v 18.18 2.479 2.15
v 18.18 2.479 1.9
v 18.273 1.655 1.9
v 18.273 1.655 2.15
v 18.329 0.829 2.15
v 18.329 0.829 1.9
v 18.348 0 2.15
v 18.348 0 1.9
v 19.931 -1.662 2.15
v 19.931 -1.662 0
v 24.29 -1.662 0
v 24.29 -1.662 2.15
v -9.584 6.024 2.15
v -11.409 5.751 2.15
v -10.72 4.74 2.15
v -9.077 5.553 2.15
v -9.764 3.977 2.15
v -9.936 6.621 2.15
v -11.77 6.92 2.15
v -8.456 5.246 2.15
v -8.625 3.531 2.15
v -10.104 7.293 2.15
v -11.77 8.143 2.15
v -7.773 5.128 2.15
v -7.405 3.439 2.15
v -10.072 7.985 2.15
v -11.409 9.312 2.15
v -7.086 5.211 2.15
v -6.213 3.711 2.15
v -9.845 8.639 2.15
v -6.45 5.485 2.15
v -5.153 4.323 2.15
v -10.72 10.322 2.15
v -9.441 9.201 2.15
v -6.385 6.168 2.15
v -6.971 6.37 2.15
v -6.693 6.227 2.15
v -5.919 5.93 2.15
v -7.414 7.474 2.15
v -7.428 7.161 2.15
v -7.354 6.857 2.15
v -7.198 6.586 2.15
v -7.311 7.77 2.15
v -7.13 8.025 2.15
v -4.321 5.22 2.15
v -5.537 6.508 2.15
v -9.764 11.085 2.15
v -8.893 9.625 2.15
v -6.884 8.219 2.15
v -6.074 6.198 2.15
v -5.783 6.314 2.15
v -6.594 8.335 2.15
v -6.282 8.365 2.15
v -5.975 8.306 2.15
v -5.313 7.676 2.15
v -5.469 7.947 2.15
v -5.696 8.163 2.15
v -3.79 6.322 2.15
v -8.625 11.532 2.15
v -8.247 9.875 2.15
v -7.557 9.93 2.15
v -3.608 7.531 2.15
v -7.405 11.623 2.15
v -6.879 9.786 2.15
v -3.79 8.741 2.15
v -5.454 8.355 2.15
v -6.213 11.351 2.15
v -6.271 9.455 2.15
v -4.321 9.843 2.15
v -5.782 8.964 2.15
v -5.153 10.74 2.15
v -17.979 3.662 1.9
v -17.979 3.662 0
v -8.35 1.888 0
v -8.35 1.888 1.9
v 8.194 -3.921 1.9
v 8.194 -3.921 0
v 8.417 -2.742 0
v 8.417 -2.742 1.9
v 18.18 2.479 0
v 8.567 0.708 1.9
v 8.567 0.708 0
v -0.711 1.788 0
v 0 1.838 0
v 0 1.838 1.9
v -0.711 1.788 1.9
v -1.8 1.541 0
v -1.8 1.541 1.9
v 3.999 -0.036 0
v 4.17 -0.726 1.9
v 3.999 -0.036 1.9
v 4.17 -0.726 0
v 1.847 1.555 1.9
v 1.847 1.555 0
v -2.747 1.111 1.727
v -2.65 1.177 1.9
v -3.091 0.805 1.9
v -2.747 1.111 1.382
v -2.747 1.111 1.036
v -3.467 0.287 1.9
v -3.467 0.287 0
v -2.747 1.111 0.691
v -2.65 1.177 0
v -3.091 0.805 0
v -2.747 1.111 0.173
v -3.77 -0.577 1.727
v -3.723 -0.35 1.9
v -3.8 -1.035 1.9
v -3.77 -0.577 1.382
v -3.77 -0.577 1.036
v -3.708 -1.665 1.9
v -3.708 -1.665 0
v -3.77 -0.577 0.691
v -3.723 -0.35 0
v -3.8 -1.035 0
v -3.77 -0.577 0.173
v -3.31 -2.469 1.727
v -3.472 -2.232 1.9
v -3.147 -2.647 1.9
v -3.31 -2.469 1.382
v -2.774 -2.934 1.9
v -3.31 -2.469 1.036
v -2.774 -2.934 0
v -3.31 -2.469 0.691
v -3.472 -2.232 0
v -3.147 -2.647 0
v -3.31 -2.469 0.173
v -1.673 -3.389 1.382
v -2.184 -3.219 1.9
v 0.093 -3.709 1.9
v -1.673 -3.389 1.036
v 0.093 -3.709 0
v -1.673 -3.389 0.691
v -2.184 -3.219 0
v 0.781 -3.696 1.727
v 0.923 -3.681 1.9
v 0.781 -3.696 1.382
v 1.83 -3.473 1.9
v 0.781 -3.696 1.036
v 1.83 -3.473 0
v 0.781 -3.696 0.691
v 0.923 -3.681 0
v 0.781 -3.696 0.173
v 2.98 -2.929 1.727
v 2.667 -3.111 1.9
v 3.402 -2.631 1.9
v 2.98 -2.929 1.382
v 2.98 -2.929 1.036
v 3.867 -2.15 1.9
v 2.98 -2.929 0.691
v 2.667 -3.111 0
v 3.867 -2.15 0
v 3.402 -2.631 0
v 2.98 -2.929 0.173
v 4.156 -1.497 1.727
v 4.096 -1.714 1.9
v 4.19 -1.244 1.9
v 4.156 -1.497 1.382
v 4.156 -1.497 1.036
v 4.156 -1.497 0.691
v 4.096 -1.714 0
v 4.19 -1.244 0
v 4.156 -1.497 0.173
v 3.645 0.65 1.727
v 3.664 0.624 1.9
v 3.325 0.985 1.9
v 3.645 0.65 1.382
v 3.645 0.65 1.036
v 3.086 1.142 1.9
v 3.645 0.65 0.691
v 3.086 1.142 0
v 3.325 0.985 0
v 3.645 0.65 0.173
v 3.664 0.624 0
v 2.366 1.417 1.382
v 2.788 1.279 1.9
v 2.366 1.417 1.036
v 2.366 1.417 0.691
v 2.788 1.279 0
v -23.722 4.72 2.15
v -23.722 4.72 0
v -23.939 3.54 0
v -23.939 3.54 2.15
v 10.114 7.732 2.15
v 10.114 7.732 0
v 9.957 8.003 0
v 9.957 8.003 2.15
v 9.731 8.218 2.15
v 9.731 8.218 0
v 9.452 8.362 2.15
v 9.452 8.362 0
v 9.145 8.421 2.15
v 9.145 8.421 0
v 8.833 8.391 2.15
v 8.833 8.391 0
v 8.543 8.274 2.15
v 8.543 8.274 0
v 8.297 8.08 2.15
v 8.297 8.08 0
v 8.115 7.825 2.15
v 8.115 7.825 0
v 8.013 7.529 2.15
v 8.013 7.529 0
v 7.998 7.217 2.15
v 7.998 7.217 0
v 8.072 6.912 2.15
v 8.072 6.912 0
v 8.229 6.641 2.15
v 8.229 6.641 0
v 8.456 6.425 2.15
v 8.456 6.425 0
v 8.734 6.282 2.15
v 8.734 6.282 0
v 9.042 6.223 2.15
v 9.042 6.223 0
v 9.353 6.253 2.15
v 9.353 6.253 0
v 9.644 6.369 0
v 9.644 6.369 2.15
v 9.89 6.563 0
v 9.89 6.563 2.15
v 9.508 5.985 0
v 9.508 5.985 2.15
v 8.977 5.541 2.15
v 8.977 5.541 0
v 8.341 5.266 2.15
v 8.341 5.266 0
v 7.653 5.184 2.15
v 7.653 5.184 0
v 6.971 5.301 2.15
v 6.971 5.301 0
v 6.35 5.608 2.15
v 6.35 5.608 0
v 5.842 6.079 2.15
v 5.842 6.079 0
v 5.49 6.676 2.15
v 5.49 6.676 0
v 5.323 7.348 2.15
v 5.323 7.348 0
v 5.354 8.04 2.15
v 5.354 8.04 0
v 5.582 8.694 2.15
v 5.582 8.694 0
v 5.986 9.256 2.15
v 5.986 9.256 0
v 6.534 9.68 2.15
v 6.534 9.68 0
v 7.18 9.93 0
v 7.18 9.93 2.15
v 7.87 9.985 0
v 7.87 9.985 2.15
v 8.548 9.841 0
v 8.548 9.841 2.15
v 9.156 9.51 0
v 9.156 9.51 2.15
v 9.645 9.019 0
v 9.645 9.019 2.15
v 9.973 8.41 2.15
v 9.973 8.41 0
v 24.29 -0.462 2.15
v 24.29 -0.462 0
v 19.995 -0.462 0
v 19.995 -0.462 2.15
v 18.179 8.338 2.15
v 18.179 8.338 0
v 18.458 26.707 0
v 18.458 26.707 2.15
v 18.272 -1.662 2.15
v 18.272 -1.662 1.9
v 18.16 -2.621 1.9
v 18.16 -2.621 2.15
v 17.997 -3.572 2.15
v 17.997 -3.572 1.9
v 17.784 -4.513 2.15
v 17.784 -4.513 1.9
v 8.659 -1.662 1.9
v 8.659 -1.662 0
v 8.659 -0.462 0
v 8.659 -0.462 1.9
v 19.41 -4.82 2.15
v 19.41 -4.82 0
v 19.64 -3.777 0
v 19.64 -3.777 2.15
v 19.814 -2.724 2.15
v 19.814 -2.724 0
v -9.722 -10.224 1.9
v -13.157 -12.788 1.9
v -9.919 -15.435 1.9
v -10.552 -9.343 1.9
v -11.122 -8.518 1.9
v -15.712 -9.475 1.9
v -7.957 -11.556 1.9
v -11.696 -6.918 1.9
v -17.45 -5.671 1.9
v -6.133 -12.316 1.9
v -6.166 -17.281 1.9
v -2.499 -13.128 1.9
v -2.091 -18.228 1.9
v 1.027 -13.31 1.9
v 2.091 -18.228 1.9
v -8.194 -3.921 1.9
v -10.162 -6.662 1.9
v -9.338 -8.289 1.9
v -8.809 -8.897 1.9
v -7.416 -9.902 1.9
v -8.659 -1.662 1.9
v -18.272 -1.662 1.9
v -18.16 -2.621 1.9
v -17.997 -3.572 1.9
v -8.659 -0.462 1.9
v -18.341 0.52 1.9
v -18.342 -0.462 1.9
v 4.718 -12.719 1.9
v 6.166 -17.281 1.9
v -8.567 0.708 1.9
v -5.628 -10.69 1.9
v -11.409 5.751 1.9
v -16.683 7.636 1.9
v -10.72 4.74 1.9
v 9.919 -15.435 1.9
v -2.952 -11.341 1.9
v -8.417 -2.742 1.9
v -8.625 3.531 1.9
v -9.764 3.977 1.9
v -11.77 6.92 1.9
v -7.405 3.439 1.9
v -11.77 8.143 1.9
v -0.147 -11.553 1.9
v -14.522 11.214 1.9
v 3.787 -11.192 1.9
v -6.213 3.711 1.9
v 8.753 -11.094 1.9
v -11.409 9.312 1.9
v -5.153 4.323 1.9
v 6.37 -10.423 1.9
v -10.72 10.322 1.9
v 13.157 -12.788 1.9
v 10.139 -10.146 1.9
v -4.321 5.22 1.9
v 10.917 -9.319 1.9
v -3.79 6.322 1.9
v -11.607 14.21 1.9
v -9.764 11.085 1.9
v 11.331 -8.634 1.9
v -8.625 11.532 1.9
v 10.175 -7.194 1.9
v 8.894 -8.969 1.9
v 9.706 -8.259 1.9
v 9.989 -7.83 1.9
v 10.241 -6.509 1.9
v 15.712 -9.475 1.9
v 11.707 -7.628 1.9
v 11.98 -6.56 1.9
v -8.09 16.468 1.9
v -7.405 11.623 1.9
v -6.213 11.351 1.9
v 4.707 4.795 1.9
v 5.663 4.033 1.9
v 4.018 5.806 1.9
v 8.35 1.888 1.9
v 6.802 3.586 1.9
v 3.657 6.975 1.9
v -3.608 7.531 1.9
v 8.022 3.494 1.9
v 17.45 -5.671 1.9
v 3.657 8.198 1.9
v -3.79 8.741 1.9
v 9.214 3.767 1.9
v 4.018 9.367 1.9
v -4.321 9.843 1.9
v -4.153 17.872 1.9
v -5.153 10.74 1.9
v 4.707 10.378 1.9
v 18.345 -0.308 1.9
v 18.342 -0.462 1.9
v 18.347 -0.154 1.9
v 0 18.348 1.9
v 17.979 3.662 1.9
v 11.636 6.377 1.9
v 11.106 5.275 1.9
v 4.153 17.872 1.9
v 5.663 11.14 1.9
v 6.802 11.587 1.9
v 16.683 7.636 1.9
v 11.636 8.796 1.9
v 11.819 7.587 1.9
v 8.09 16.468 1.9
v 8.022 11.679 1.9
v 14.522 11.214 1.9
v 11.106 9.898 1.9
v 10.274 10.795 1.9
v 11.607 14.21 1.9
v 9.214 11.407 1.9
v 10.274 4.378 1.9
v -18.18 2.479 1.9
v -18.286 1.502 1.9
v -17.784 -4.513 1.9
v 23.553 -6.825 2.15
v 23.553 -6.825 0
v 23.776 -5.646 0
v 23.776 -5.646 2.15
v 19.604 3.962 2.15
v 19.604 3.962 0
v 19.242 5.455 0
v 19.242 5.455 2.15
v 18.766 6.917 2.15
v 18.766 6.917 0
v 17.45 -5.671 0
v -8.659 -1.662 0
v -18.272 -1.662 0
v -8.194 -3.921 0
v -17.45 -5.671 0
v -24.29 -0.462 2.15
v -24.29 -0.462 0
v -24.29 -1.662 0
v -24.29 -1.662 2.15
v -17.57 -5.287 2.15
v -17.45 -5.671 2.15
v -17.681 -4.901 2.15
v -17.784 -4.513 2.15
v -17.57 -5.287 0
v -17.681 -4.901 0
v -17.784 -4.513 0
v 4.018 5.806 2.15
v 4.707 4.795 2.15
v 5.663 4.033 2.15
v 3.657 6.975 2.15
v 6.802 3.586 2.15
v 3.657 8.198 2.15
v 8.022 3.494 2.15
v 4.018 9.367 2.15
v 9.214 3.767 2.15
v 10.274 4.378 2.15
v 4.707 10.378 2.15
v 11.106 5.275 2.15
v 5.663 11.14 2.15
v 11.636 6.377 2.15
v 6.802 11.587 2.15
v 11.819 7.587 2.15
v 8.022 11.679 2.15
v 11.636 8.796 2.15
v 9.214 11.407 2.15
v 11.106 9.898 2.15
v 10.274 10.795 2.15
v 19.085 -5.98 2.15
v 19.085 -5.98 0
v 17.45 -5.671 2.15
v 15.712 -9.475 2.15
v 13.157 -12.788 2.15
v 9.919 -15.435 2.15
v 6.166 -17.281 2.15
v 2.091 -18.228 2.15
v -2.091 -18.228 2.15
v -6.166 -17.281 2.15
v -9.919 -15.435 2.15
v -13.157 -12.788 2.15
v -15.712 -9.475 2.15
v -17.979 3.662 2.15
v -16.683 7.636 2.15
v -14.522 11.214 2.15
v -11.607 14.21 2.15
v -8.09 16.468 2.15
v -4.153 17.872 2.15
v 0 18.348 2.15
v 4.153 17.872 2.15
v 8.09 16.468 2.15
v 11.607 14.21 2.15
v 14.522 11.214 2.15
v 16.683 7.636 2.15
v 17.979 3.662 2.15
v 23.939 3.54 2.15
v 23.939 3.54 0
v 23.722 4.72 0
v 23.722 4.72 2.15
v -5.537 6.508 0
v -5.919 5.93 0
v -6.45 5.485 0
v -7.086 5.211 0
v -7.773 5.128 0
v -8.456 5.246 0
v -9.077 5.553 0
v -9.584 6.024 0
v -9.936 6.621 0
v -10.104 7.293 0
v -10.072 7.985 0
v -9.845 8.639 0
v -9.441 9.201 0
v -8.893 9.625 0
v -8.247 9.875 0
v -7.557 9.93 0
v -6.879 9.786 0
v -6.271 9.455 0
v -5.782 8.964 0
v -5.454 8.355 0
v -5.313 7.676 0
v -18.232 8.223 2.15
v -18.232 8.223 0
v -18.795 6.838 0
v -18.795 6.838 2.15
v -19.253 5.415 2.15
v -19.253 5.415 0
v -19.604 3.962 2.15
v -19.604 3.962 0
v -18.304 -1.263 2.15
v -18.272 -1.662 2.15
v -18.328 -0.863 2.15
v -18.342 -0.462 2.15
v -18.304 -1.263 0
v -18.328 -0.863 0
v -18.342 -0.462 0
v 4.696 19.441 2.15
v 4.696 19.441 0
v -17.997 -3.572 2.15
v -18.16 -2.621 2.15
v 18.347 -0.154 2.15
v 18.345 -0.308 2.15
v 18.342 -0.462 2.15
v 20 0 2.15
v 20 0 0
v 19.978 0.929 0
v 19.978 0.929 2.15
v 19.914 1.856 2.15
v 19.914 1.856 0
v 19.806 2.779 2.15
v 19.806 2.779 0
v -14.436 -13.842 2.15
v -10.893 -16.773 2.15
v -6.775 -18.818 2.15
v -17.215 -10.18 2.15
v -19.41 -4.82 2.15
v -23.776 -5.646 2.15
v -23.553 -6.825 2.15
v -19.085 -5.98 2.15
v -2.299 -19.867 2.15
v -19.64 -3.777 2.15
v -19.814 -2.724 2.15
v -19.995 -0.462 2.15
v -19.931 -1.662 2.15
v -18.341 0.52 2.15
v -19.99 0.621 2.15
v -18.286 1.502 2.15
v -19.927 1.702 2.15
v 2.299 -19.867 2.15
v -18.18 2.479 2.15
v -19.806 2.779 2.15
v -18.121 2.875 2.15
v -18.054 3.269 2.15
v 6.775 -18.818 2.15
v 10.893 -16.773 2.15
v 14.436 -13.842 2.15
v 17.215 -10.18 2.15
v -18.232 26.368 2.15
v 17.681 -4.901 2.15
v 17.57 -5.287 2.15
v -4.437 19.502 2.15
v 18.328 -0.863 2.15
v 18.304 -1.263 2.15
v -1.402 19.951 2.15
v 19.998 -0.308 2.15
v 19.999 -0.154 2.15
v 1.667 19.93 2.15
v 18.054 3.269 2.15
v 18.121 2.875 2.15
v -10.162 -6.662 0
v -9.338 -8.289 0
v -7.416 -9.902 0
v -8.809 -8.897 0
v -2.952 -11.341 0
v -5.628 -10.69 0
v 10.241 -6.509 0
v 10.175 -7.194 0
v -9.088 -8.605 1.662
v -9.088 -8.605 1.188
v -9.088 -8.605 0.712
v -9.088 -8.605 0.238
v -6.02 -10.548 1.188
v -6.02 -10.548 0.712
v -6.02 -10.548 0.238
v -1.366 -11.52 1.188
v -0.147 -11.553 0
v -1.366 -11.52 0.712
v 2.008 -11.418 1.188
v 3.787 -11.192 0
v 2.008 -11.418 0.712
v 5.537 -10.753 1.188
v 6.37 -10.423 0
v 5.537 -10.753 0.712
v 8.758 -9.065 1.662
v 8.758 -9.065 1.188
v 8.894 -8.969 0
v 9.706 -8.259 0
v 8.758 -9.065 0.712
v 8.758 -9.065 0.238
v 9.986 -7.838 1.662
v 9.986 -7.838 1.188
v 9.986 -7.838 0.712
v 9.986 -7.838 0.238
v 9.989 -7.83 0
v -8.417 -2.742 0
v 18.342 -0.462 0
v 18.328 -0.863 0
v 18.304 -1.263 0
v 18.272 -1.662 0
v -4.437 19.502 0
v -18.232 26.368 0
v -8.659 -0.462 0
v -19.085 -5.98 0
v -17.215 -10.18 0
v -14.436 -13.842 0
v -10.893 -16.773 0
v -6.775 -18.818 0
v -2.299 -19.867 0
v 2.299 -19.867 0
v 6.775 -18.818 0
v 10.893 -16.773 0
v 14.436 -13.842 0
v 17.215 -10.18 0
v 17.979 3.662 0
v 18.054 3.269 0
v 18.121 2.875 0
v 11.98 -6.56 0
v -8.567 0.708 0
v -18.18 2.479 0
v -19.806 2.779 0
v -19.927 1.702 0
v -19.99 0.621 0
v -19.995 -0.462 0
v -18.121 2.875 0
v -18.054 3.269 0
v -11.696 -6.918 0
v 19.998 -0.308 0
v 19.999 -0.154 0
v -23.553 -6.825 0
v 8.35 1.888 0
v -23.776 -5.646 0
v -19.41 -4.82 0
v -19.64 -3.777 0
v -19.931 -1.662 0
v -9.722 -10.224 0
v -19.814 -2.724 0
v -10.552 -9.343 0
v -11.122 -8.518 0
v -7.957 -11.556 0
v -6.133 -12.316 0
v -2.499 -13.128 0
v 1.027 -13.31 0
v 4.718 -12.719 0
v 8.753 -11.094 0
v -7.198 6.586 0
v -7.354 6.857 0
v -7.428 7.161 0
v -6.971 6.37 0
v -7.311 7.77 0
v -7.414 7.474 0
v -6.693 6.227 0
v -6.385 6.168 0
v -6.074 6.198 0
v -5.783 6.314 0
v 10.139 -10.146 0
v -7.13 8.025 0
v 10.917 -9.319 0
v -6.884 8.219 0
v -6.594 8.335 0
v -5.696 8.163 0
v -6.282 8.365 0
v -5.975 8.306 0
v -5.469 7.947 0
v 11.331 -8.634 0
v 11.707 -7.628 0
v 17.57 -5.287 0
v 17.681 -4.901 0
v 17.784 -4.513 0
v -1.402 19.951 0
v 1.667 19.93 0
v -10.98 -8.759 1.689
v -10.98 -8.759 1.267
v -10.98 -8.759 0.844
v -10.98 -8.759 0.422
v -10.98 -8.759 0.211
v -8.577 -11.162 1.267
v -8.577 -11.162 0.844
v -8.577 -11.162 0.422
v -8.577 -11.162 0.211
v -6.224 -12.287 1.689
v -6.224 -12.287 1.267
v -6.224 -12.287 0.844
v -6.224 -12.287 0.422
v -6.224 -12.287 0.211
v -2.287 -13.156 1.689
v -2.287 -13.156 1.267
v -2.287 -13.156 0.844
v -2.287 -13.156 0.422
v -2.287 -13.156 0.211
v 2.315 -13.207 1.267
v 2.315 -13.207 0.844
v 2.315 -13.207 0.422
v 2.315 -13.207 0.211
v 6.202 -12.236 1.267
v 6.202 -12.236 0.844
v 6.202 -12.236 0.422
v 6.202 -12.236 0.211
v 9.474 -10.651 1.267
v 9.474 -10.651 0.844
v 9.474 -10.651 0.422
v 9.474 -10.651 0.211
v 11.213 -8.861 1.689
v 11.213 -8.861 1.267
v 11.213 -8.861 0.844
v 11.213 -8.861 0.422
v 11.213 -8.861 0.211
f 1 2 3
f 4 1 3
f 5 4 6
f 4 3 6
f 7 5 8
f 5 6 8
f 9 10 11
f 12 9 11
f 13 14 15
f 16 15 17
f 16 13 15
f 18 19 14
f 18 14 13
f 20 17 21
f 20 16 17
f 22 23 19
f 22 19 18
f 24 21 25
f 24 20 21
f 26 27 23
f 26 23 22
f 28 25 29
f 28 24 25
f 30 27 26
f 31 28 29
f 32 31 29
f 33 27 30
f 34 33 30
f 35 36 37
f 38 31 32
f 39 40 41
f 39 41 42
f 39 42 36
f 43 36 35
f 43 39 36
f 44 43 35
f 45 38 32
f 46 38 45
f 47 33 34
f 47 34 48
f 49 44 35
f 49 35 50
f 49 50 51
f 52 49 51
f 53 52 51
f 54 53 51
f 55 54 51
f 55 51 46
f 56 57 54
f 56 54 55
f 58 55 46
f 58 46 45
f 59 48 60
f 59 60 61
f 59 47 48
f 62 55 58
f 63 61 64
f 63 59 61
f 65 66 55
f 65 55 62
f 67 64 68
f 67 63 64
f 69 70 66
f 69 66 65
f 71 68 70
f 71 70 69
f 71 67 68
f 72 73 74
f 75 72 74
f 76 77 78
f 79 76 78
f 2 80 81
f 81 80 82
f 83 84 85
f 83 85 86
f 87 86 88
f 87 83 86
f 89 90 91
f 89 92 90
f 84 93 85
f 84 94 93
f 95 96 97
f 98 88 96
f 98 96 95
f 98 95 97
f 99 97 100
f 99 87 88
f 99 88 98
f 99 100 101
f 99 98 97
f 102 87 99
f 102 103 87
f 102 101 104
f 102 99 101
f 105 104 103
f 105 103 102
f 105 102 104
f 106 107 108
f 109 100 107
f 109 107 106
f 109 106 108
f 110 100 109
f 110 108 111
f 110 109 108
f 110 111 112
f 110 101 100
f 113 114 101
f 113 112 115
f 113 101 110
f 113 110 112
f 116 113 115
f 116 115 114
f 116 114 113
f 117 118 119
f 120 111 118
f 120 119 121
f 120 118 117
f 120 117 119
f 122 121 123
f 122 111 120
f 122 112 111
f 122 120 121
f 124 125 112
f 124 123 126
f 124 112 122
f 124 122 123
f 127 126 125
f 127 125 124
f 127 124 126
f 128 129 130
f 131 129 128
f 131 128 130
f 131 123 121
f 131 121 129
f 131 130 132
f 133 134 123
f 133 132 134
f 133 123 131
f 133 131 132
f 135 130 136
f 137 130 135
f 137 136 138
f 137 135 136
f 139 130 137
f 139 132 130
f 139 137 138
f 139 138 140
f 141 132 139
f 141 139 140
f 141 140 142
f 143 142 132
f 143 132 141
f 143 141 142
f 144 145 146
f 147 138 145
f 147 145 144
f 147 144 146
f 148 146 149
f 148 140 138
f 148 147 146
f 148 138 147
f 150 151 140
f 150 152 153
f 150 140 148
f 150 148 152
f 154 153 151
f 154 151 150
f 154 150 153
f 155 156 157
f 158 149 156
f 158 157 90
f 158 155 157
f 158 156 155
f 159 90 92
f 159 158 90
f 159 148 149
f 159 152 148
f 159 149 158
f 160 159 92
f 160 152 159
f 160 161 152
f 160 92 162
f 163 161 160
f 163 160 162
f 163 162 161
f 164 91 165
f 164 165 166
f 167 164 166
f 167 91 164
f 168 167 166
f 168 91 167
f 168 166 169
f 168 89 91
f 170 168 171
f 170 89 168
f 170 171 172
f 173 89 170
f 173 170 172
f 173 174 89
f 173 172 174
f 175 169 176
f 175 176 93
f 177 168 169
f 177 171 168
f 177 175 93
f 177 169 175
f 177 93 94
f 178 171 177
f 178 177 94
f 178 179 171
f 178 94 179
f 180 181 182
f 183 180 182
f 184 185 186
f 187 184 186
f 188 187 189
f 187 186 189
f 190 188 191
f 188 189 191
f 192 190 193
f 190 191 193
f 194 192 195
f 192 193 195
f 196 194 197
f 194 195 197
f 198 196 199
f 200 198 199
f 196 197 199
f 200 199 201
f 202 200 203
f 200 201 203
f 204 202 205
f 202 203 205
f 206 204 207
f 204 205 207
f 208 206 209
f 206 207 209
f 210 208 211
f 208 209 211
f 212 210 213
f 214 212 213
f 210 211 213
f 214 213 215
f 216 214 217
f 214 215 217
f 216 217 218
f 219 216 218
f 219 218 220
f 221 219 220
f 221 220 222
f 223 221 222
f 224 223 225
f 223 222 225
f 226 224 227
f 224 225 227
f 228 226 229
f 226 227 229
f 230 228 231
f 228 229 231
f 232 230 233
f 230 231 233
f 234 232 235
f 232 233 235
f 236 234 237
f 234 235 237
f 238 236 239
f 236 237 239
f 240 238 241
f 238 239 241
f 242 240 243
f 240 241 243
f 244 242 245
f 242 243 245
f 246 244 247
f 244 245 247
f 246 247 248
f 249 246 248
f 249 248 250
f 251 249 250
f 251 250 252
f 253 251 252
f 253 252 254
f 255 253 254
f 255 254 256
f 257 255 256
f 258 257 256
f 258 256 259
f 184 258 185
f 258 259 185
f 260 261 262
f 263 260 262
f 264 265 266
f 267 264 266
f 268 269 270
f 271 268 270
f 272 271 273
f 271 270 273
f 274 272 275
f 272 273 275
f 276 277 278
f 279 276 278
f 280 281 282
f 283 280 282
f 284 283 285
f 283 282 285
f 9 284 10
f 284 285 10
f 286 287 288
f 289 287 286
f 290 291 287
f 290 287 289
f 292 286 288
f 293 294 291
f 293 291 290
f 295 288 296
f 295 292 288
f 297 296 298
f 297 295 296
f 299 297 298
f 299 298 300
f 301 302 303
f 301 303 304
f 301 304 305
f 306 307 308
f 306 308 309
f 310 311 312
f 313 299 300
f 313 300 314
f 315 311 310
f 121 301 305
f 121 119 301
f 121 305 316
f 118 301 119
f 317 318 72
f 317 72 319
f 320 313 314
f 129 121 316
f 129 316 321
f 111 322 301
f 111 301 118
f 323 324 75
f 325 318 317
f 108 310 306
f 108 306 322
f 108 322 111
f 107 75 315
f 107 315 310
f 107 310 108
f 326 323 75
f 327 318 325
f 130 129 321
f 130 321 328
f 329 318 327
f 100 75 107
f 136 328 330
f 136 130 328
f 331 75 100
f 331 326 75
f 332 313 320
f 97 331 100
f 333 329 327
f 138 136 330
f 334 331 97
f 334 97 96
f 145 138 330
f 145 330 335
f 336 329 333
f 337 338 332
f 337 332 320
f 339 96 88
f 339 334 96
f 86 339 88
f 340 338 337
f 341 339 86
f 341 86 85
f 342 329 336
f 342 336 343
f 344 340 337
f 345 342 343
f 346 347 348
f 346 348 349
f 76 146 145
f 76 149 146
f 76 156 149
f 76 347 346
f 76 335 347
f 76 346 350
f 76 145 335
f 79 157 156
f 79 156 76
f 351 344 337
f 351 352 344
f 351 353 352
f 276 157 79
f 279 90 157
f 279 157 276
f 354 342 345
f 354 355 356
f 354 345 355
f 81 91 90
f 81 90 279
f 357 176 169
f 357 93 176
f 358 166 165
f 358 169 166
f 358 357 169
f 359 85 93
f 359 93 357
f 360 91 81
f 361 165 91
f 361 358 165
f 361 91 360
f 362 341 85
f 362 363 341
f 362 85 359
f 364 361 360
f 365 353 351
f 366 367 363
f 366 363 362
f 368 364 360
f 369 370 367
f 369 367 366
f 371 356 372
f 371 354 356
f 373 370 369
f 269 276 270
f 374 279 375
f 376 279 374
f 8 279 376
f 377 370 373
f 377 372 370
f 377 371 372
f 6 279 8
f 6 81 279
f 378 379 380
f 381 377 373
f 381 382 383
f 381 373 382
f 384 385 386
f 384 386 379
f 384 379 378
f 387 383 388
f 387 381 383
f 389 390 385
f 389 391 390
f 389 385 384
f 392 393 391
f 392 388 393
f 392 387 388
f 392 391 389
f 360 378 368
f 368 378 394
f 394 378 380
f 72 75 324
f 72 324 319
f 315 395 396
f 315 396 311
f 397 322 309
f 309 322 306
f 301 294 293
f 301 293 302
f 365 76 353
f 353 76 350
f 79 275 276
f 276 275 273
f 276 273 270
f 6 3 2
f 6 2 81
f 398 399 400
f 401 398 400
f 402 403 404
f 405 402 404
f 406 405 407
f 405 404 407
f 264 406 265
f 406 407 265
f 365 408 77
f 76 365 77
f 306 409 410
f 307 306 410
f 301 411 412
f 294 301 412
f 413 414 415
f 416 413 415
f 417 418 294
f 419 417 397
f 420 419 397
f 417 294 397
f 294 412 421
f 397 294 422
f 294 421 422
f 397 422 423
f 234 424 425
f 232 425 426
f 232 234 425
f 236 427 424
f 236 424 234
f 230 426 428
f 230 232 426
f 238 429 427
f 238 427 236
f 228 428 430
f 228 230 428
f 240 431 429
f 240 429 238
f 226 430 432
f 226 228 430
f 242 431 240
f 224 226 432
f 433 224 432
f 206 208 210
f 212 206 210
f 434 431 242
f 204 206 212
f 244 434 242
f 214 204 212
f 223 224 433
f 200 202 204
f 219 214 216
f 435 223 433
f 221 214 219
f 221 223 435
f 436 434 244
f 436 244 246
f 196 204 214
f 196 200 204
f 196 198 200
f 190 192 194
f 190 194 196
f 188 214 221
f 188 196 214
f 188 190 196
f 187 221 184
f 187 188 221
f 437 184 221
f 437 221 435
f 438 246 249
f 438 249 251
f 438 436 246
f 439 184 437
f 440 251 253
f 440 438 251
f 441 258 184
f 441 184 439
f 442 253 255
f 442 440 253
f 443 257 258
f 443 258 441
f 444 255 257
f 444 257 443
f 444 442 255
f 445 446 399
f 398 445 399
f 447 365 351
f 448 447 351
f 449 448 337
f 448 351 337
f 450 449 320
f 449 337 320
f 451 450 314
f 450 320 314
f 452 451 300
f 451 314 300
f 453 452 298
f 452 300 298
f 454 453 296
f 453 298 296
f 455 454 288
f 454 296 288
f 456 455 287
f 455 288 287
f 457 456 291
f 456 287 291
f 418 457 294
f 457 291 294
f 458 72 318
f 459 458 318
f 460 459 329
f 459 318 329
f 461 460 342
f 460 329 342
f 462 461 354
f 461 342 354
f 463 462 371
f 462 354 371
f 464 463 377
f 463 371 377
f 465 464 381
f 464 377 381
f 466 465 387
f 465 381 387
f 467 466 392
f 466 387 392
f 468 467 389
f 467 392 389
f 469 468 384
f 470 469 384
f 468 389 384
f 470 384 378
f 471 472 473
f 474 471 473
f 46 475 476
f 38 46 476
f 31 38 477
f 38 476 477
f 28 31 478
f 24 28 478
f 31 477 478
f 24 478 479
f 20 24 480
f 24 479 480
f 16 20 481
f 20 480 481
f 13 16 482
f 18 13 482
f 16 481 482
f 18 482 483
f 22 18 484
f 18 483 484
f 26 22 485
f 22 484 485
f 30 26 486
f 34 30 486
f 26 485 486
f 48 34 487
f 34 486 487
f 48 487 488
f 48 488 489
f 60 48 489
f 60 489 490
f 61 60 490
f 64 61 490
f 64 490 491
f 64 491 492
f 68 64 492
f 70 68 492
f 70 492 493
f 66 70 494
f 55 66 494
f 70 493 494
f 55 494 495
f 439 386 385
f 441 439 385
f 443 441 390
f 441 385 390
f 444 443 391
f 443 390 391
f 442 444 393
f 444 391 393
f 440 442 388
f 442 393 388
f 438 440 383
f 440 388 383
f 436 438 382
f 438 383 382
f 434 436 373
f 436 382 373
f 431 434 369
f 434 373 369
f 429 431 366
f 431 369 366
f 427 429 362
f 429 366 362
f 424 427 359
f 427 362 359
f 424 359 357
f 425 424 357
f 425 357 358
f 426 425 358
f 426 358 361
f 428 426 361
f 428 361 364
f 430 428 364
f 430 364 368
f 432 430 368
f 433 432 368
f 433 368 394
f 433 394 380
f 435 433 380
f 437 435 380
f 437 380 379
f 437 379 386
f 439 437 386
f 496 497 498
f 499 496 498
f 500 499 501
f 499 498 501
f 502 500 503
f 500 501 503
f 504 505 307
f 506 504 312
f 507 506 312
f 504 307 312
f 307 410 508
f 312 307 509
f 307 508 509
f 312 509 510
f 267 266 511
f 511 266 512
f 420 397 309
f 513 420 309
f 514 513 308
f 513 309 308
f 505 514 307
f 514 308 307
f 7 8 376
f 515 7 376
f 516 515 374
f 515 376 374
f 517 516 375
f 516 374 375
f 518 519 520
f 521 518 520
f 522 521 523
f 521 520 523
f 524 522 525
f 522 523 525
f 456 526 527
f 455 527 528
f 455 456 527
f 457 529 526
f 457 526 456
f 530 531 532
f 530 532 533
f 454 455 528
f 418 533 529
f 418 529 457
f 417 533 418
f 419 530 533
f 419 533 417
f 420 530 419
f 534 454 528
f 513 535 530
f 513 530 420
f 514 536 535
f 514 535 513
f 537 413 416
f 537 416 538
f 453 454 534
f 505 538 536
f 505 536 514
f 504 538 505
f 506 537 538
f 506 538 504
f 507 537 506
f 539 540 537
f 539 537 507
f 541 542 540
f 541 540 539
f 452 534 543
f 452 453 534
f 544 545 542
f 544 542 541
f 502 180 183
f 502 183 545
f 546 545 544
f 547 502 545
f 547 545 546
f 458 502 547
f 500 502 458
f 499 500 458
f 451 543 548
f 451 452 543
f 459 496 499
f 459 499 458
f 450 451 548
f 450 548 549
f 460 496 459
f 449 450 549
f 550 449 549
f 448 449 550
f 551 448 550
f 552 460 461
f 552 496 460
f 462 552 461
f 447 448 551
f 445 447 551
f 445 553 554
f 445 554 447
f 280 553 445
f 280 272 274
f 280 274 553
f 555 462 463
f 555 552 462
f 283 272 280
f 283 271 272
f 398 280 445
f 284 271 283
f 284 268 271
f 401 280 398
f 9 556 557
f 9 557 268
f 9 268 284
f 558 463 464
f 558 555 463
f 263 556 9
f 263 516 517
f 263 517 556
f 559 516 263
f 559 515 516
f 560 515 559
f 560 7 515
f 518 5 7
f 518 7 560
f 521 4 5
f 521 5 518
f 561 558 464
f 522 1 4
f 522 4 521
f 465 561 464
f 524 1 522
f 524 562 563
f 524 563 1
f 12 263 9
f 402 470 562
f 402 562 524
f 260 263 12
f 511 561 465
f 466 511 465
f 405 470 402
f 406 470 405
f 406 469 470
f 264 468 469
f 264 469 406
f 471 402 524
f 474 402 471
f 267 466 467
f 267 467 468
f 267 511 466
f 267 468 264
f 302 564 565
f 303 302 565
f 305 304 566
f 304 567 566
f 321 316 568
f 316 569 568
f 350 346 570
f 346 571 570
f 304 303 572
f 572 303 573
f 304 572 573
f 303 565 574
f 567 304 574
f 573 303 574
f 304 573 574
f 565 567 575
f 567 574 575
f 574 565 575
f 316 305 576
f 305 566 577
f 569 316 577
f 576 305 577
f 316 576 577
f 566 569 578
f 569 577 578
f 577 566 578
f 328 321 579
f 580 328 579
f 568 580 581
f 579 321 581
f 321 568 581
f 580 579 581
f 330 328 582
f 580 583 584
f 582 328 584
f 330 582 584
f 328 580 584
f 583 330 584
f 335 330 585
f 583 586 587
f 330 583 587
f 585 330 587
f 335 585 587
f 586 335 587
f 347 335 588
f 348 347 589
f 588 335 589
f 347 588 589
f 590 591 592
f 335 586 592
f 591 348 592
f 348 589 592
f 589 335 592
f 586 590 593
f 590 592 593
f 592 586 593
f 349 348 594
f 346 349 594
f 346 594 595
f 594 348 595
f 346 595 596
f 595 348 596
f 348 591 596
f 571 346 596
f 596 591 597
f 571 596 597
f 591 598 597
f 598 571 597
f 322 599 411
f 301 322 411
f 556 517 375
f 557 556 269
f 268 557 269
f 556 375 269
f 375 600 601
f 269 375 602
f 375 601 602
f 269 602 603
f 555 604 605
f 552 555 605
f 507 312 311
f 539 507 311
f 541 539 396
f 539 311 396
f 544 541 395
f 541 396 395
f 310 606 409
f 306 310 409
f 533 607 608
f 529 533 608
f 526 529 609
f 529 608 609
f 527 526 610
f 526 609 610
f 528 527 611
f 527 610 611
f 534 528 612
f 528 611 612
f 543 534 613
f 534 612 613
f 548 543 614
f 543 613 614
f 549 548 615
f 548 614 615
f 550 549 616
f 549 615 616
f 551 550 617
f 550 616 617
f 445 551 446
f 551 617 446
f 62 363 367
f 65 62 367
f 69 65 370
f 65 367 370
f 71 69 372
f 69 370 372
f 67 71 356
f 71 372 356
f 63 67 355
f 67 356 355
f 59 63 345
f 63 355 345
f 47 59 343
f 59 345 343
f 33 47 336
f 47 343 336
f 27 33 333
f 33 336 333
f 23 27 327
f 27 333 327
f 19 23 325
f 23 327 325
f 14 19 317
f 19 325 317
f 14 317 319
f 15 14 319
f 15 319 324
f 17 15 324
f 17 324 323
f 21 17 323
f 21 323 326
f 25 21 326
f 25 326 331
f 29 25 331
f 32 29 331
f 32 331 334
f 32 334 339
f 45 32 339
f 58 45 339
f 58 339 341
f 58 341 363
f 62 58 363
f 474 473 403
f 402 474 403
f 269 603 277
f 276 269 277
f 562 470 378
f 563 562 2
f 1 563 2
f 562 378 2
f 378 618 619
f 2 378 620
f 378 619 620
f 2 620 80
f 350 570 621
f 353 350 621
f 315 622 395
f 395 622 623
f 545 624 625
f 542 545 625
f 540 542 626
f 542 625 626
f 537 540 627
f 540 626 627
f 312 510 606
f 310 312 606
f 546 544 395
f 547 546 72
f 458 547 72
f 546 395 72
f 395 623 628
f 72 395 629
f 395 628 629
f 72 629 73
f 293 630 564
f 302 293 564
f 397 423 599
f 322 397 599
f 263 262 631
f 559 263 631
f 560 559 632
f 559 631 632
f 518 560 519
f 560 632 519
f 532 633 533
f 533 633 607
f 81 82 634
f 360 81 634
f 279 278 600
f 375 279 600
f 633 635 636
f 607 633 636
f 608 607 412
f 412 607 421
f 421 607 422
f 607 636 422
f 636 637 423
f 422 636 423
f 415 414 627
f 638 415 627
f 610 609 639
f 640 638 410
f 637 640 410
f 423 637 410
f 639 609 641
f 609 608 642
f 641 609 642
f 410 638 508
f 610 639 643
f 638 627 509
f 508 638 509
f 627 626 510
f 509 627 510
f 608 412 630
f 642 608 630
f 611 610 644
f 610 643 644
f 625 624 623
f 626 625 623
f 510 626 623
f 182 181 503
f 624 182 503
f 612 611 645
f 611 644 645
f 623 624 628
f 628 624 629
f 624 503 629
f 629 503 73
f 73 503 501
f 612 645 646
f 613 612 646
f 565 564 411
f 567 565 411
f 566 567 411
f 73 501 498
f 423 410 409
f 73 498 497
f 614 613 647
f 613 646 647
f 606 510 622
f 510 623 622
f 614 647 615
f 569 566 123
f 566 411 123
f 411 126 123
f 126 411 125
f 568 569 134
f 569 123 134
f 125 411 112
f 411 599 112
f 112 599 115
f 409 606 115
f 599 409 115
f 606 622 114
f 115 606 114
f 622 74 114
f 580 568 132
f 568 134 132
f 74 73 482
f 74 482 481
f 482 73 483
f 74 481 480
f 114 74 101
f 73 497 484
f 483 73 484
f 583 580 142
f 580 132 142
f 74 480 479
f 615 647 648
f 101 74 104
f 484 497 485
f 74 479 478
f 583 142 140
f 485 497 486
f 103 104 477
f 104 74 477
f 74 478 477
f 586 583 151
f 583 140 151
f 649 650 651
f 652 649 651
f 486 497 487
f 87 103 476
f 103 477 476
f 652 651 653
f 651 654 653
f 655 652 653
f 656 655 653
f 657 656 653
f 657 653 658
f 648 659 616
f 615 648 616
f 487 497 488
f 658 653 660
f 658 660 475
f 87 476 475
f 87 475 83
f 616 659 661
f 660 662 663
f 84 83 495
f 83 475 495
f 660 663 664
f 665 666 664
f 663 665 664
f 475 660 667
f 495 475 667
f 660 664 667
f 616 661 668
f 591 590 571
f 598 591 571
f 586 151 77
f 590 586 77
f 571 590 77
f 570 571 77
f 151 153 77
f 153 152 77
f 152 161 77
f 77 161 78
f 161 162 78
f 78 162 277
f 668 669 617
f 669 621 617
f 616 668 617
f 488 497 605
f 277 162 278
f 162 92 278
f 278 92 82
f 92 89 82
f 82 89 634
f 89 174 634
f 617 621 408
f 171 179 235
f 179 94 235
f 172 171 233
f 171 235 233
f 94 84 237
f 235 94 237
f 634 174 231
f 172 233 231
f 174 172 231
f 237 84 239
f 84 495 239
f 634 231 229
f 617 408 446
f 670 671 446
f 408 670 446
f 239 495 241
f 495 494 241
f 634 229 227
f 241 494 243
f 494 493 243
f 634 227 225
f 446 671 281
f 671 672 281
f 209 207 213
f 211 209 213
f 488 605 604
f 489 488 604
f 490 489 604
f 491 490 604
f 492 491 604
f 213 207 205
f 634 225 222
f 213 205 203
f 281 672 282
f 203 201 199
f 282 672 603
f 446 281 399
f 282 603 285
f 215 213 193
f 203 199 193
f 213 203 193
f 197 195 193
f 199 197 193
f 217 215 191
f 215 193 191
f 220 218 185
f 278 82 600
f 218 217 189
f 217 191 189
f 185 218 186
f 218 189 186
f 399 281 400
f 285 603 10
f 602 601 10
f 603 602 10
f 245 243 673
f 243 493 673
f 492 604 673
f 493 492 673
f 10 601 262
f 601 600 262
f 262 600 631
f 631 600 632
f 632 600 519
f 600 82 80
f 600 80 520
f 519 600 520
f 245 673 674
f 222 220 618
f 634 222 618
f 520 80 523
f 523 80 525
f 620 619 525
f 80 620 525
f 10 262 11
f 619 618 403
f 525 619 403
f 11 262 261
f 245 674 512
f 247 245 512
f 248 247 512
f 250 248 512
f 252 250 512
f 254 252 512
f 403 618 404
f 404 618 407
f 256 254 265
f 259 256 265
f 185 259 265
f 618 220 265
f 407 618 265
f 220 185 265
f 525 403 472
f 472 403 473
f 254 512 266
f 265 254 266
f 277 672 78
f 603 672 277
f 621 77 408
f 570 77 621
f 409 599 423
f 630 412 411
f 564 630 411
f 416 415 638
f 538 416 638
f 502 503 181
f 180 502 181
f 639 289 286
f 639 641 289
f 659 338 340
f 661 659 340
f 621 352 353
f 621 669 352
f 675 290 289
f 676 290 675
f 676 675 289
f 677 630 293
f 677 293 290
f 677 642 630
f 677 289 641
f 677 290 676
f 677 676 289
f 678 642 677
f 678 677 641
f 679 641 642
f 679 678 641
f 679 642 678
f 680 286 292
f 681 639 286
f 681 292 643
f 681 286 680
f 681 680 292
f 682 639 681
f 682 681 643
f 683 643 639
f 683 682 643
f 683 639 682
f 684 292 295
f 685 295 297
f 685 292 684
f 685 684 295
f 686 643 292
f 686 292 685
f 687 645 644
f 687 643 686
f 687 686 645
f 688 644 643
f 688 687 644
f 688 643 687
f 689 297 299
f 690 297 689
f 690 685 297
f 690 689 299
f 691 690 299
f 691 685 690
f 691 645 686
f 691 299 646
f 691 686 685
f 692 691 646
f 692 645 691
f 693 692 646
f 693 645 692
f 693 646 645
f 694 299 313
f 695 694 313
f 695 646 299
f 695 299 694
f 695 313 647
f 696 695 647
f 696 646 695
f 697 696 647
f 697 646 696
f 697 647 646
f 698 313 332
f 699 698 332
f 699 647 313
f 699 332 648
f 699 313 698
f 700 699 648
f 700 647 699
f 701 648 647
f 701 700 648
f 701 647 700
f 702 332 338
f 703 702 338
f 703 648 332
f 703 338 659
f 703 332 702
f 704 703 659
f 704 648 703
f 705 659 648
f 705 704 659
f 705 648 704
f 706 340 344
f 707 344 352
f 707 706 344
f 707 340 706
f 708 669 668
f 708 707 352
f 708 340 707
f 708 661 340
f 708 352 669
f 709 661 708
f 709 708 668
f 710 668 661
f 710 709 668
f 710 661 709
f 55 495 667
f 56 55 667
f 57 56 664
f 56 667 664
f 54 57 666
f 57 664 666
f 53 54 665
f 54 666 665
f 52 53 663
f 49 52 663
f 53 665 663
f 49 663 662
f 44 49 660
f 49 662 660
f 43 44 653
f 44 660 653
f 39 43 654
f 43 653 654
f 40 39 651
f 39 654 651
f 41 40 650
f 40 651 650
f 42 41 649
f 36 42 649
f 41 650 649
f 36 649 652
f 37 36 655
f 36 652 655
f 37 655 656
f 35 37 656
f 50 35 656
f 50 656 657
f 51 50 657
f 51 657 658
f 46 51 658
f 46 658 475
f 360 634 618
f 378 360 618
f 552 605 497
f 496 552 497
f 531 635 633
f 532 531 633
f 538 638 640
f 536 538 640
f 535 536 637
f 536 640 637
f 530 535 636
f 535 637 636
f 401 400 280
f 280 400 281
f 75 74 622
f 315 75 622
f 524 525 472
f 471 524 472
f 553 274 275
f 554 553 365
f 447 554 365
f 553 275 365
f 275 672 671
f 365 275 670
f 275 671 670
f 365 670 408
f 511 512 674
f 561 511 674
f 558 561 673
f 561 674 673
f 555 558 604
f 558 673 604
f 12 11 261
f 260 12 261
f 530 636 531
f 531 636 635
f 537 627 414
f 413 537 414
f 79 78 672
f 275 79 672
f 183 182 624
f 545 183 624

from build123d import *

# Parameters (mm, degrees)
F1_DEPTH = 2.15
F0_R     = 4.1036540216
F2_DEPTH = 1.9


with BuildPart() as f1:
    # F0 (on Top) → F1 (new body)
    with BuildSketch(Plane.XY):
        with BuildLine():
            ThreePointArc((-18.2315145686, 8.2226441328), (-12.65969487, 15.4832853684), (-4.4368690482, 19.5016459062))
            Line((-4.4368690482, 19.5016459062), (-18.2315145686, 26.3684952472))
            Line((-18.2315145686, 26.3684952472), (-18.2315145686, 8.2226441328))
        make_face()
        with BuildLine():
            ThreePointArc((19.6037292835, 3.9615398747), (19.0177158249, 6.1908387802), (18.179090742, 8.3379050004))
            ThreePointArc((18.179090742, 8.3379050004), (12.7135725246, 15.439076192), (4.6958516098, 19.4409098979))
            ThreePointArc((4.6958516098, 19.4409098979), (0.1330045393, 19.9995577399), (-4.4368690482, 19.5016459062))
            ThreePointArc((-4.4368690482, 19.5016459062), (-12.65969487, 15.4832853684), (-18.2315145686, 8.2226441328))
            ThreePointArc((-18.2315145686, 8.2226441328), (-19.0372180665, 6.1306058663), (-19.6037292835, 3.9615398747))
            Line((-19.6037292835, 3.9615398747), (-17.978764876, 3.6621177333))
            ThreePointArc((-17.978764876, 3.6621177333), (0, 18.3479451917), (17.978764876, 3.6621177333))
            Line((17.978764876, 3.6621177333), (19.6037292835, 3.9615398747))
        make_face()
        with BuildLine():
            ThreePointArc((4.6958516098, 19.4409098979), (12.7135725246, 15.439076192), (18.179090742, 8.3379050004))
            Line((18.179090742, 8.3379050004), (18.4577219188, 26.7067048699))
            Line((18.4577219188, 26.7067048699), (4.6958516098, 19.4409098979))
        make_face()
        with BuildLine():
            ThreePointArc((-18.3421170895, -0.4624212731), (-18.3200411776, 1.0115255856), (-18.1797121369, 2.4789431978))
            Line((-18.1797121369, 2.4789431978), (-19.8060417091, 2.7786168896))
            ThreePointArc((-19.8060417091, 2.7786168896), (-19.9662193685, 1.1619312074), (-19.9946534495, -0.4624212731))
            Line((-19.9946534495, -0.4624212731), (-18.3421170895, -0.4624212731))
        make_face()
        with BuildLine():
            ThreePointArc((-19.8060417091, 2.7786168896), (-19.7137601466, 3.3715961919), (-19.6037292835, 3.9615398747))
            Line((-19.6037292835, 3.9615398747), (-23.7219620696, 4.72038116))
            Line((-23.7219620696, 4.72038116), (-23.9394178087, 3.5402485397))
            Line((-23.9394178087, 3.5402485397), (-19.8060417091, 2.7786168896))
        make_face()
        with BuildLine():
            ThreePointArc((-18.1797121369, 2.4789431978), (-18.0889148505, 3.0721738704), (-17.978764876, 3.6621177333))
            Line((-17.978764876, 3.6621177333), (-19.6037292835, 3.9615398747))
            ThreePointArc((-19.6037292835, 3.9615398747), (-19.7137601466, 3.3715961919), (-19.8060417091, 2.7786168896))
            Line((-19.8060417091, 2.7786168896), (-18.1797121369, 2.4789431978))
        make_face()
        with BuildLine():
            ThreePointArc((-18.2724778908, -1.6624212731), (-18.3171269962, -1.0629917055), (-18.3421170895, -0.4624212731))
            Line((-18.3421170895, -0.4624212731), (-19.9946534495, -0.4624212731))
            ThreePointArc((-19.9946534495, -0.4624212731), (-19.9717360631, -1.0629010416), (-19.9307891342, -1.6624212731))
            Line((-19.9307891342, -1.6624212731), (-18.2724778908, -1.6624212731))
        make_face()
        with BuildLine():
            ThreePointArc((-19.9307891342, -1.6624212731), (-19.9717360631, -1.0629010416), (-19.9946534495, -0.4624212731))
            Line((-19.9946534495, -0.4624212731), (-24.2901714519, -0.4624212731))
            Line((-24.2901714519, -0.4624212731), (-24.2901714519, -1.6624212731))
            Line((-24.2901714519, -1.6624212731), (-19.9307891342, -1.6624212731))
        make_face()
        with BuildLine():
            ThreePointArc((-19.0850973204, -5.9798879815), (-19.2565147907, -5.4024659293), (-19.4104665936, -4.8201438381))
            Line((-19.4104665936, -4.8201438381), (-23.7761723296, -5.645501185))
            Line((-23.7761723296, -5.645501185), (-23.5532553866, -6.8246144266))
            Line((-23.5532553866, -6.8246144266), (-19.0850973204, -5.9798879815))
        make_face()
        with BuildLine():
            ThreePointArc((-17.4496494979, -5.6706988246), (-17.6265029869, -5.0944563215), (-17.7843327477, -4.5127155326))
            Line((-17.7843327477, -4.5127155326), (-19.4104665936, -4.8201438381))
            ThreePointArc((-19.4104665936, -4.8201438381), (-19.2565147907, -5.4024659293), (-19.0850973204, -5.9798879815))
            Line((-19.0850973204, -5.9798879815), (-17.4496494979, -5.6706988246))
        make_face()
        with BuildLine():
            ThreePointArc((-17.7843327477, -4.5127155326), (-18.0846466014, -3.0972003588), (-18.2724778908, -1.6624212731))
            Line((-18.2724778908, -1.6624212731), (-19.9307891342, -1.6624212731))
            ThreePointArc((-19.9307891342, -1.6624212731), (-19.7338897207, -3.2517067044), (-19.4104665936, -4.8201438381))
            Line((-19.4104665936, -4.8201438381), (-17.7843327477, -4.5127155326))
        make_face()
        with BuildLine():
            ThreePointArc((-19.0850973204, -5.9798879815), (0, -20), (19.0850973204, -5.9798879815))
            Line((19.0850973204, -5.9798879815), (17.4496494979, -5.6706988246))
            ThreePointArc((17.4496494979, -5.6706988246), (0, -18.3479451917), (-17.4496494979, -5.6706988246))
            Line((-17.4496494979, -5.6706988246), (-19.0850973204, -5.9798879815))
        make_face()
        with BuildLine():
            ThreePointArc((19.4104665936, -4.8201438381), (19.7338897207, -3.2517067044), (19.9307891342, -1.6624212731))
            Line((19.9307891342, -1.6624212731), (18.2724778908, -1.6624212731))
            ThreePointArc((18.2724778908, -1.6624212731), (18.0846466014, -3.0972003588), (17.7843327477, -4.5127155326))
            Line((17.7843327477, -4.5127155326), (19.4104665936, -4.8201438381))
        make_face()
        with BuildLine():
            ThreePointArc((19.0850973204, -5.9798879815), (19.2565147907, -5.4024659293), (19.4104665936, -4.8201438381))
            Line((19.4104665936, -4.8201438381), (17.7843327477, -4.5127155326))
            ThreePointArc((17.7843327477, -4.5127155326), (17.6265029869, -5.0944563215), (17.4496494979, -5.6706988246))
            Line((17.4496494979, -5.6706988246), (19.0850973204, -5.9798879815))
        make_face()
        with BuildLine():
            Line((23.7761723296, -5.645501185), (19.4104665936, -4.8201438381))
            ThreePointArc((19.4104665936, -4.8201438381), (19.2565147907, -5.4024659293), (19.0850973204, -5.9798879815))
            Line((19.0850973204, -5.9798879815), (23.5532553866, -6.8246144266))
            Line((23.5532553866, -6.8246144266), (23.7761723296, -5.645501185))
        make_face()
        with BuildLine():
            Line((24.2901714519, -0.4624212731), (19.9946534495, -0.4624212731))
            ThreePointArc((19.9946534495, -0.4624212731), (19.9717360631, -1.0629010416), (19.9307891342, -1.6624212731))
            Line((19.9307891342, -1.6624212731), (24.2901714519, -1.6624212731))
            Line((24.2901714519, -1.6624212731), (24.2901714519, -0.4624212731))
        make_face()
        with BuildLine():
            ThreePointArc((19.9307891342, -1.6624212731), (19.9717360631, -1.0629010416), (19.9946534495, -0.4624212731))
            Line((19.9946534495, -0.4624212731), (18.3421170895, -0.4624212731))
            ThreePointArc((18.3421170895, -0.4624212731), (18.3171269962, -1.0629917055), (18.2724778908, -1.6624212731))
            Line((18.2724778908, -1.6624212731), (19.9307891342, -1.6624212731))
        make_face()
        with BuildLine():
            ThreePointArc((20, 0), (19.9514515033, 1.3926890929), (19.8060417091, 2.7786168896))
            Line((19.8060417091, 2.7786168896), (18.1797121369, 2.4789431978))
            ThreePointArc((18.1797121369, 2.4789431978), (18.305838613, 1.2423225969), (18.3479451917, 0))
            ThreePointArc((18.3479451917, 0), (18.3464881083, -0.2312289993), (18.3421170895, -0.4624212731))
            Line((18.3421170895, -0.4624212731), (19.9946534495, -0.4624212731))
            ThreePointArc((19.9946534495, -0.4624212731), (19.9986633177, -0.2312260903), (20, 0))
        make_face()
        with BuildLine():
            Line((23.7219620696, 4.72038116), (19.6037292835, 3.9615398747))
            ThreePointArc((19.6037292835, 3.9615398747), (19.7137601466, 3.3715961919), (19.8060417091, 2.7786168896))
            Line((19.8060417091, 2.7786168896), (23.9394178087, 3.5402485397))
            Line((23.9394178087, 3.5402485397), (23.7219620696, 4.72038116))
        make_face()
        with BuildLine():
            ThreePointArc((19.8060417091, 2.7786168896), (19.7137601466, 3.3715961919), (19.6037292835, 3.9615398747))
            Line((19.6037292835, 3.9615398747), (17.978764876, 3.6621177333))
            ThreePointArc((17.978764876, 3.6621177333), (18.0889148505, 3.0721738704), (18.1797121369, 2.4789431978))
            Line((18.1797121369, 2.4789431978), (19.8060417091, 2.7786168896))
        make_face()
    extrude(amount=F1_DEPTH)


with BuildPart() as f1b:
    # F0 (on Top) → F1, piece 2 (new body)
    with BuildSketch(Plane.XY):
        with Locations((-7.7118381825, 7.5312841645)):
            Circle(F0_R)
        with BuildLine():
            ThreePointArc((-5.5369759371, 6.5077966729), (-10.0723658161, 7.9845630229), (-5.3125703898, 7.6764271657))
            ThreePointArc((-5.3125703898, 7.6764271657), (-5.253350505, 7.4752971286), (-5.2333685565, 7.2665843875))
            ThreePointArc((-5.2333685565, 7.2665843875), (-5.3120870377, 6.8579475569), (-5.5369759371, 6.5077966729))
        make_face(mode=Mode.SUBTRACT)
        with BuildLine():
            ThreePointArc((-5.5369759371, 6.5077966729), (-5.3660793806, 7.0069101804), (-5.3081842074, 7.5312841645))
            ThreePointArc((-5.3081842074, 7.5312841645), (-5.3092810033, 7.6038887948), (-5.3125703898, 7.6764271657))
            ThreePointArc((-5.3125703898, 7.6764271657), (-7.4136323648, 7.4740213769), (-5.5369759371, 6.5077966729))
        make_face()
        with BuildLine():
            ThreePointArc((-5.3125703898, 7.6764271657), (-5.3092810033, 7.6038887948), (-5.3081842074, 7.5312841645))
            ThreePointArc((-5.3081842074, 7.5312841645), (-5.3660793806, 7.0069101804), (-5.5369759371, 6.5077966729))
            ThreePointArc((-5.5369759371, 6.5077966729), (-5.3120870377, 6.8579475569), (-5.2333685565, 7.2665843875))
            ThreePointArc((-5.2333685565, 7.2665843875), (-5.253350505, 7.4752971286), (-5.3125703898, 7.6764271657))
        make_face()
    extrude(amount=F1_DEPTH)


with BuildPart() as f1c:
    # F0 (on Top) → F1, piece 3 (new body)
    with BuildSketch(Plane.XY):
        with Locations((7.7149522848, 7.5865211994)):
            Circle(F0_R)
        with BuildLine():
            ThreePointArc((9.8898145302, 6.5630337078), (5.3544246513, 8.0398000578), (10.1142200775, 7.7316642005))
            ThreePointArc((10.1142200775, 7.7316642005), (10.1734399624, 7.5305341635), (10.1934219108, 7.3218214224))
            ThreePointArc((10.1934219108, 7.3218214224), (10.1147034296, 6.9131845918), (9.8898145302, 6.5630337078))
        make_face(mode=Mode.SUBTRACT)
        with BuildLine():
            ThreePointArc((9.8898145302, 6.5630337078), (10.0607110867, 7.0621472153), (10.1186062599, 7.5865211994))
            ThreePointArc((10.1186062599, 7.5865211994), (10.1175094641, 7.6591258297), (10.1142200775, 7.7316642005))
            ThreePointArc((10.1142200775, 7.7316642005), (8.0131581026, 7.5292584118), (9.8898145302, 6.5630337078))
        make_face()
        with BuildLine():
            ThreePointArc((10.1142200775, 7.7316642005), (10.1175094641, 7.6591258297), (10.1186062599, 7.5865211994))
            ThreePointArc((10.1186062599, 7.5865211994), (10.0607110867, 7.0621472153), (9.8898145302, 6.5630337078))
            ThreePointArc((9.8898145302, 6.5630337078), (10.1147034296, 6.9131845918), (10.1934219108, 7.3218214224))
            ThreePointArc((10.1934219108, 7.3218214224), (10.1734399624, 7.5305341635), (10.1142200775, 7.7316642005))
        make_face()
    extrude(amount=F1_DEPTH)


with BuildPart() as f2:
    # F0 (on Top) → F2 (new body)
    with BuildSketch(Plane.XY):
        with BuildLine():
            Line((8.3496756393, 1.887825013), (17.978764876, 3.6621177333))
            ThreePointArc((17.978764876, 3.6621177333), (0, 18.3479451917), (-17.978764876, 3.6621177333))
            Line((-17.978764876, 3.6621177333), (-8.3496756393, 1.887825013))
            Line((-8.3496756393, 1.887825013), (-8.5671313784, 0.7076923927))
            Line((-8.5671313784, 0.7076923927), (-18.1797121369, 2.4789431978))
            ThreePointArc((-18.1797121369, 2.4789431978), (-18.3200411776, 1.0115255856), (-18.3421170895, -0.4624212731))
            Line((-18.3421170895, -0.4624212731), (-8.6590945721, -0.4624212731))
            Line((-8.6590945721, -0.4624212731), (-8.6590945721, -1.6624212731))
            Line((-8.6590945721, -1.6624212731), (-18.2724778908, -1.6624212731))
            ThreePointArc((-18.2724778908, -1.6624212731), (-18.0846466014, -3.0972003588), (-17.7843327477, -4.5127155326))
            Line((-17.7843327477, -4.5127155326), (-8.4171642217, -2.7418079567))
            Line((-8.4171642217, -2.7418079567), (-8.1942472787, -3.9209211983))
            Line((-8.1942472787, -3.9209211983), (-17.4496494979, -5.6706988246))
            ThreePointArc((-17.4496494979, -5.6706988246), (0, -18.3479451917), (17.4496494979, -5.6706988246))
            Line((17.4496494979, -5.6706988246), (8.1942472787, -3.9209211983))
            Line((8.1942472787, -3.9209211983), (8.4171642217, -2.7418079567))
            Line((8.4171642217, -2.7418079567), (17.7843327477, -4.5127155326))
            ThreePointArc((17.7843327477, -4.5127155326), (18.0846466014, -3.0972003588), (18.2724778908, -1.6624212731))
            Line((18.2724778908, -1.6624212731), (8.6590945721, -1.6624212731))
            Line((8.6590945721, -1.6624212731), (8.6590945721, -0.4624212731))
            Line((8.6590945721, -0.4624212731), (18.3421170895, -0.4624212731))
            ThreePointArc((18.3421170895, -0.4624212731), (18.3464881083, -0.2312289993), (18.3479451917, 0))
            ThreePointArc((18.3479451917, 0), (18.305838613, 1.2423225969), (18.1797121369, 2.4789431978))
            Line((18.1797121369, 2.4789431978), (8.5671313784, 0.7076923927))
            Line((8.5671313784, 0.7076923927), (8.3496756393, 1.887825013))
        make_face()
        with BuildLine():
            Line((-11.6958739236, -6.9176834077), (-10.1618021727, -6.6620046273))
            add(Edge.make_bspline(
                [(-10.1618021727, -6.6620046273), (-9.8900116773, -7.3300264218), (-9.2706047281, -8.8524392682), (-6.0490483327, -10.8328828476), (-1.3745638516, -11.690245176), (1.9800848773, -11.4468079335), (5.5595215389, -11.0179939412), (8.7279029447, -9.1864827043), (10.1426697727, -7.9661276659), (10.2098408587, -6.9739310726), (10.2413436398, -6.5085976385)],
                knots=[0, 0, 0, 0, 0.1087885677, 0.2479277089, 0.4071152467, 0.5412765042, 0.6796227072, 0.8188582734, 0.9150457659, 1, 1, 1, 1], degree=3))
            Line((10.2413436398, -6.5085976385), (11.9799589738, -6.5597333014))
            add(Edge.make_bspline(
                [(-11.6958739236, -6.9176834077), (-11.5432726645, -7.5145274134), (-11.1904906877, -8.894305074), (-8.5974695498, -11.3626813298), (-6.2456902452, -12.3743976683), (-2.2369994203, -13.3243571631), (2.3289760904, -13.4155306098), (6.1632762213, -12.3582244459), (9.5239431845, -10.8326055627), (11.4033144172, -8.9902188317), (11.7886527022, -7.3660655901), (11.9799589738, -6.5597333014)],
                knots=[0, 0, 0, 0, 0.0874959413, 0.2022721917, 0.3028006249, 0.4278145213, 0.5613757119, 0.6859804824, 0.804699095, 0.903040291, 1, 1, 1, 1], degree=3))
        make_face(mode=Mode.SUBTRACT)
        with BuildLine():
            add(Edge.make_bspline(
                [(0, 1.8378595123), (-0.4987013095, 1.8506227906), (-1.2332615441, 1.6769219671), (-2.904337988, 1.306683963), (-4.0573022018, -0.5231820909), (-3.5249184784, -2.6958648787), (-1.6642591529, -3.4764890484), (0.7978749827, -3.9253086049), (3.0182361275, -3.0665363229), (4.543548882, -1.6513964591), (3.8129464246, 0.880339001), (2.4191893632, 1.4692653954), (0.6847440305, 1.8203348367), (0, 1.8378595123)],
                knots=[0, 0, 0, 0, 0.0739136356, 0.1563551567, 0.2483102745, 0.3396572591, 0.4293536009, 0.5323106777, 0.6322081288, 0.7213164828, 0.8185830799, 0.898512557, 1, 1, 1, 1], degree=3))
        make_face(mode=Mode.SUBTRACT)
        with Locations((-7.7118381825, 7.5312841645)):
            Circle(F0_R, mode=Mode.SUBTRACT)
        with Locations((7.7149522848, 7.5865211994)):
            Circle(F0_R, mode=Mode.SUBTRACT)
    extrude(amount=F2_DEPTH)


with BuildPart() as f1b_1:
    add(f1b.part)

    # F3: union F1, F1c, F2
    add(f1.part)
    add(f1c.part)
    add(f2.part)


solid = f1b_1.part
